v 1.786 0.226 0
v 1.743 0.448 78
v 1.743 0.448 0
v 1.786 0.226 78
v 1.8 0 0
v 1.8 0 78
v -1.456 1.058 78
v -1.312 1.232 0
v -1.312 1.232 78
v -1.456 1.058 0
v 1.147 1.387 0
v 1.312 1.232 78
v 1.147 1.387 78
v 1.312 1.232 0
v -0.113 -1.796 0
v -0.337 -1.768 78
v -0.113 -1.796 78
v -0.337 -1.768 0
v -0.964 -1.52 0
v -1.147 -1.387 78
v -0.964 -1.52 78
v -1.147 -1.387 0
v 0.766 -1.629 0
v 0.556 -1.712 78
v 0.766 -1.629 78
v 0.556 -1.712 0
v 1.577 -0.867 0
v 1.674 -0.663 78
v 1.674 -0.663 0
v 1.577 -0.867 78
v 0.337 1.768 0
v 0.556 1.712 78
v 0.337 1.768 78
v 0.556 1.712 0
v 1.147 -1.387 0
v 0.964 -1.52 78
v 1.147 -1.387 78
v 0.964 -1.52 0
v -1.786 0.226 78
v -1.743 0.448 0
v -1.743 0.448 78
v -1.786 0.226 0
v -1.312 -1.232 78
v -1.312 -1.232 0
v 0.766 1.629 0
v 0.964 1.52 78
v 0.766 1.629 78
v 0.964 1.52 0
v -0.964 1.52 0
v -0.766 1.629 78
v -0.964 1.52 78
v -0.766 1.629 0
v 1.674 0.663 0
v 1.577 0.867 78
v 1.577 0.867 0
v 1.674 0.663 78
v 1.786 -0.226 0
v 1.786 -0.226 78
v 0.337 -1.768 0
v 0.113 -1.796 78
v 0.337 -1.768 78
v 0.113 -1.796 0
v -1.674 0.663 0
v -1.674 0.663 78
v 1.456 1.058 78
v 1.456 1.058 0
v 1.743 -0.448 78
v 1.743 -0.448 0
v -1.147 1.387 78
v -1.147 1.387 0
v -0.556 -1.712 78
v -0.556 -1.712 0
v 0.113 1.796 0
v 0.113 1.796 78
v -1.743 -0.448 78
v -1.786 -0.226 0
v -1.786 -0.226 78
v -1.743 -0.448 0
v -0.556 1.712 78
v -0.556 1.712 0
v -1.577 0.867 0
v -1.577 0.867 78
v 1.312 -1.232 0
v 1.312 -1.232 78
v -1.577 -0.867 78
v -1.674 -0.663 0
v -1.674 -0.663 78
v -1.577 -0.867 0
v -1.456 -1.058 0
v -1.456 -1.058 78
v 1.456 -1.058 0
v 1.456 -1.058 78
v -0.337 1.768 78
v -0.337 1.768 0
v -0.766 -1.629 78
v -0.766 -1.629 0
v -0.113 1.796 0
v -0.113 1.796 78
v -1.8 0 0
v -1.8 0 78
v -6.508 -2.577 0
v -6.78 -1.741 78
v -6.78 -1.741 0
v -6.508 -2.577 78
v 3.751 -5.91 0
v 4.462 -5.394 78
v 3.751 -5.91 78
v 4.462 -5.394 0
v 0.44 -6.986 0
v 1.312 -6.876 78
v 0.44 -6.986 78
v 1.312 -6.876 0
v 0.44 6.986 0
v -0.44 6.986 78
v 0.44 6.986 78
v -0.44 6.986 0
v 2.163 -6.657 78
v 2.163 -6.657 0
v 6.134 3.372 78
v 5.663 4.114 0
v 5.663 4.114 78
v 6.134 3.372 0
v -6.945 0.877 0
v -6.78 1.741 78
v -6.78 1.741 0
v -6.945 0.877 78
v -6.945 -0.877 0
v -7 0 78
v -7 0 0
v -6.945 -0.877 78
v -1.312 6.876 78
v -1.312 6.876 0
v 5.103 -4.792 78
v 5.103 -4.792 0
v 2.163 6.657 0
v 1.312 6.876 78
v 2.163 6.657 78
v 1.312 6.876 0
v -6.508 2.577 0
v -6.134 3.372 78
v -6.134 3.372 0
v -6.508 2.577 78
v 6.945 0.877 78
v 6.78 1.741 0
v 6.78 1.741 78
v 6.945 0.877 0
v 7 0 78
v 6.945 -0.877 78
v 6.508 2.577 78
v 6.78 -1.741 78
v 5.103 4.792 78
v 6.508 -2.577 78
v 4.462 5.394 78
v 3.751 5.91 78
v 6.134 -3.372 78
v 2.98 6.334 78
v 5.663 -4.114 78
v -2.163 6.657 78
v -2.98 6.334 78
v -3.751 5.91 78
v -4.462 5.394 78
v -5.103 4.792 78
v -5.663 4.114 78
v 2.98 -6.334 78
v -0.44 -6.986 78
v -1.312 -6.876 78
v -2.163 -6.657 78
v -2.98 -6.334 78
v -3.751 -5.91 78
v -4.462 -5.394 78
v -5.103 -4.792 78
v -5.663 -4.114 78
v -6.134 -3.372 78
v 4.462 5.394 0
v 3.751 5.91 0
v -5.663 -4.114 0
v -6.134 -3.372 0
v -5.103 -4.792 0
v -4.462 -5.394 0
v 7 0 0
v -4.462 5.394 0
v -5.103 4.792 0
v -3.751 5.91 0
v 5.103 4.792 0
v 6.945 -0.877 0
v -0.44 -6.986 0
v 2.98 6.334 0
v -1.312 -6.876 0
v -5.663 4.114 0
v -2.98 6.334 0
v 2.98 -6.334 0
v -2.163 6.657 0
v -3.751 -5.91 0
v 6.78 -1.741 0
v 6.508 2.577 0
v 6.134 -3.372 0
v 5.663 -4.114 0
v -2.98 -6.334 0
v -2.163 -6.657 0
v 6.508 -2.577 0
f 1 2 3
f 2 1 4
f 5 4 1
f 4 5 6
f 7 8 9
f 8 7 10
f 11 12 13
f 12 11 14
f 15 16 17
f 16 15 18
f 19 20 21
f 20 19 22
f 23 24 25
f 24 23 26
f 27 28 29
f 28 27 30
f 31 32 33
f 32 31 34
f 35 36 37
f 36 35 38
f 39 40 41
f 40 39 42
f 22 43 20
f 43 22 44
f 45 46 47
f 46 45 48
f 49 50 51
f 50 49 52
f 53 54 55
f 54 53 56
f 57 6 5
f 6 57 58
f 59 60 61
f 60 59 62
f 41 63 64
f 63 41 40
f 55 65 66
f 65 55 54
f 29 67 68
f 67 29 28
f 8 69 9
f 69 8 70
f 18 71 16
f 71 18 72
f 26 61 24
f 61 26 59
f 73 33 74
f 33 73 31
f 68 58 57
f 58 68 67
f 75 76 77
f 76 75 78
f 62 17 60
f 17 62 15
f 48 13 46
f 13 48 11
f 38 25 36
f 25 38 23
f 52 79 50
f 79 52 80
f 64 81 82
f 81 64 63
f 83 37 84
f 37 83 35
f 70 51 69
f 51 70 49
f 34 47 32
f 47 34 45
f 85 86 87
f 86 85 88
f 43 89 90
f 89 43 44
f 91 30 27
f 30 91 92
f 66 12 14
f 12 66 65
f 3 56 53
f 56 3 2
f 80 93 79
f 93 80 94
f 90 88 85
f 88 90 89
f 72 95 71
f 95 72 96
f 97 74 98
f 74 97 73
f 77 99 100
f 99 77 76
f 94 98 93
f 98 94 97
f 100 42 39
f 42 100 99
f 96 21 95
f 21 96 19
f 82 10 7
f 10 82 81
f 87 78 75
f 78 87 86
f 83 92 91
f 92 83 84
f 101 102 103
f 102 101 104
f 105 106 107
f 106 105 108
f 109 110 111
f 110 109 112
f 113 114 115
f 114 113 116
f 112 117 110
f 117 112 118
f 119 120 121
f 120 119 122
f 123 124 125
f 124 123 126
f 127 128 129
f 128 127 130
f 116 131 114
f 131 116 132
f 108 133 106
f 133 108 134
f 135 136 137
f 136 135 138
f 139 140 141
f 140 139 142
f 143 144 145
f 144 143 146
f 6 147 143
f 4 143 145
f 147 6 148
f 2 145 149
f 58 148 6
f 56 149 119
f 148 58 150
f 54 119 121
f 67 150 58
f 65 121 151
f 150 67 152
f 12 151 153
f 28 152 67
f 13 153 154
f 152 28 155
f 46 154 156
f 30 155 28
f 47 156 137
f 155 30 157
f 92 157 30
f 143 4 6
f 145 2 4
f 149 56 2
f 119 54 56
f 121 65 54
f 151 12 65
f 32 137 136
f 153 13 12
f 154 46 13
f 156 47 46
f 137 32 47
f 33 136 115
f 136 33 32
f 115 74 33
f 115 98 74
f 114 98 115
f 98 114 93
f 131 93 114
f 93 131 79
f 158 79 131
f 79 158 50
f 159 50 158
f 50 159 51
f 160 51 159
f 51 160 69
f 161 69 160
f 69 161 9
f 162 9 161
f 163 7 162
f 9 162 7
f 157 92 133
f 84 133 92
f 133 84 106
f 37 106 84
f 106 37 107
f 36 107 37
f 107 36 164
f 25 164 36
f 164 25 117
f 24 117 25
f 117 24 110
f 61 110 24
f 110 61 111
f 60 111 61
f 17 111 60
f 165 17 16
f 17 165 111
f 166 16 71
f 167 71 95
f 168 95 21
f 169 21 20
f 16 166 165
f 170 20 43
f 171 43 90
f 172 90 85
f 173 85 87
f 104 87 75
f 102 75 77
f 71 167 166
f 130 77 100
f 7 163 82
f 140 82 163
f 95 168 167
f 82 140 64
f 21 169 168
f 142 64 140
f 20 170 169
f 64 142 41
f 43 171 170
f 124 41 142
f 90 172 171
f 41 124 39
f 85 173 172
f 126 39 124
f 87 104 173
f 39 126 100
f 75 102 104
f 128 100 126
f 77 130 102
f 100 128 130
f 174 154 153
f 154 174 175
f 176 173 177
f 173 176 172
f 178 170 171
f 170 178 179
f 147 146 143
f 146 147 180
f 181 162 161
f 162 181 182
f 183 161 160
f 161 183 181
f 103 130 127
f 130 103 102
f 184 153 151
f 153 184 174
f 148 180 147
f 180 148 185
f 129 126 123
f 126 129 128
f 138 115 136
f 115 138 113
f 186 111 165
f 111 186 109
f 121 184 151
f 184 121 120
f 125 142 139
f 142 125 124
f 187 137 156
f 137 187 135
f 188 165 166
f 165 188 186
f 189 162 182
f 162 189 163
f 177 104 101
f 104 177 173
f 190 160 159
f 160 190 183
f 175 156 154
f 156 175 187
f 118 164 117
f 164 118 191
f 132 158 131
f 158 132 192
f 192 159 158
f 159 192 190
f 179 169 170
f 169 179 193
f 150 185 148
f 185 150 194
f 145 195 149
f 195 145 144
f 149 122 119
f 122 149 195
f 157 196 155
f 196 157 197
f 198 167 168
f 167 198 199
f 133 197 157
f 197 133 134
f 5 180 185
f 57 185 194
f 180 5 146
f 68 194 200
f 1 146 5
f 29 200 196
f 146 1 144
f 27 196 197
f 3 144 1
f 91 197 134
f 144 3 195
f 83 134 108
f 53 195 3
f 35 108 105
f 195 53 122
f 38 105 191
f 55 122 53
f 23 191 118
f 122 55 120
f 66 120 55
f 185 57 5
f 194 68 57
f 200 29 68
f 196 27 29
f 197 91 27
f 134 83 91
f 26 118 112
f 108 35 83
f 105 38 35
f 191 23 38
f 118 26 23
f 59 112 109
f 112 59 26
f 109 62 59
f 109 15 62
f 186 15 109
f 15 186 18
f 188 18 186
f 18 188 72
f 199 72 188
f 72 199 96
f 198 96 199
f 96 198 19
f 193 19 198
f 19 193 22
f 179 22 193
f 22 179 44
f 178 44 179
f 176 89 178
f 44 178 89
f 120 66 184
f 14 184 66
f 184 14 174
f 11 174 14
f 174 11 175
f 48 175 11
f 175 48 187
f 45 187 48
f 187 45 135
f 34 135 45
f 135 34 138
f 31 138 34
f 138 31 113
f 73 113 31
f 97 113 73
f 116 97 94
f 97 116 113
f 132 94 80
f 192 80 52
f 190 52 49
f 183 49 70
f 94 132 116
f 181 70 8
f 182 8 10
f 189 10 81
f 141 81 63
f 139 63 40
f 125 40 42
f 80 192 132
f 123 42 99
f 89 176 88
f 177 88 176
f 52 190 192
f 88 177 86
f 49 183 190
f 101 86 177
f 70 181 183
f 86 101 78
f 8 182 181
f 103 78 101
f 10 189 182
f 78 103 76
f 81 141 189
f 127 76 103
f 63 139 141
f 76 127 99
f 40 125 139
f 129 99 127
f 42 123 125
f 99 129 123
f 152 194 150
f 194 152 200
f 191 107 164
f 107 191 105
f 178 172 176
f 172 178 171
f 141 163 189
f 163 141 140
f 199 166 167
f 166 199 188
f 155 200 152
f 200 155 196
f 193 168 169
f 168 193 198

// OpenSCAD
$fn = 50;


difference() {
	union() {
		cylinder(h = 78, r = 7.0000000000);
	}
	union() {
		translate(v = [0, 0, -100]) {
			cylinder(h = 200, r = 1.8000000000);
		}
		translate(v = [0, 0, -100]) {
			cylinder(h = 200, r = 1.8000000000);
		}
	}
}
